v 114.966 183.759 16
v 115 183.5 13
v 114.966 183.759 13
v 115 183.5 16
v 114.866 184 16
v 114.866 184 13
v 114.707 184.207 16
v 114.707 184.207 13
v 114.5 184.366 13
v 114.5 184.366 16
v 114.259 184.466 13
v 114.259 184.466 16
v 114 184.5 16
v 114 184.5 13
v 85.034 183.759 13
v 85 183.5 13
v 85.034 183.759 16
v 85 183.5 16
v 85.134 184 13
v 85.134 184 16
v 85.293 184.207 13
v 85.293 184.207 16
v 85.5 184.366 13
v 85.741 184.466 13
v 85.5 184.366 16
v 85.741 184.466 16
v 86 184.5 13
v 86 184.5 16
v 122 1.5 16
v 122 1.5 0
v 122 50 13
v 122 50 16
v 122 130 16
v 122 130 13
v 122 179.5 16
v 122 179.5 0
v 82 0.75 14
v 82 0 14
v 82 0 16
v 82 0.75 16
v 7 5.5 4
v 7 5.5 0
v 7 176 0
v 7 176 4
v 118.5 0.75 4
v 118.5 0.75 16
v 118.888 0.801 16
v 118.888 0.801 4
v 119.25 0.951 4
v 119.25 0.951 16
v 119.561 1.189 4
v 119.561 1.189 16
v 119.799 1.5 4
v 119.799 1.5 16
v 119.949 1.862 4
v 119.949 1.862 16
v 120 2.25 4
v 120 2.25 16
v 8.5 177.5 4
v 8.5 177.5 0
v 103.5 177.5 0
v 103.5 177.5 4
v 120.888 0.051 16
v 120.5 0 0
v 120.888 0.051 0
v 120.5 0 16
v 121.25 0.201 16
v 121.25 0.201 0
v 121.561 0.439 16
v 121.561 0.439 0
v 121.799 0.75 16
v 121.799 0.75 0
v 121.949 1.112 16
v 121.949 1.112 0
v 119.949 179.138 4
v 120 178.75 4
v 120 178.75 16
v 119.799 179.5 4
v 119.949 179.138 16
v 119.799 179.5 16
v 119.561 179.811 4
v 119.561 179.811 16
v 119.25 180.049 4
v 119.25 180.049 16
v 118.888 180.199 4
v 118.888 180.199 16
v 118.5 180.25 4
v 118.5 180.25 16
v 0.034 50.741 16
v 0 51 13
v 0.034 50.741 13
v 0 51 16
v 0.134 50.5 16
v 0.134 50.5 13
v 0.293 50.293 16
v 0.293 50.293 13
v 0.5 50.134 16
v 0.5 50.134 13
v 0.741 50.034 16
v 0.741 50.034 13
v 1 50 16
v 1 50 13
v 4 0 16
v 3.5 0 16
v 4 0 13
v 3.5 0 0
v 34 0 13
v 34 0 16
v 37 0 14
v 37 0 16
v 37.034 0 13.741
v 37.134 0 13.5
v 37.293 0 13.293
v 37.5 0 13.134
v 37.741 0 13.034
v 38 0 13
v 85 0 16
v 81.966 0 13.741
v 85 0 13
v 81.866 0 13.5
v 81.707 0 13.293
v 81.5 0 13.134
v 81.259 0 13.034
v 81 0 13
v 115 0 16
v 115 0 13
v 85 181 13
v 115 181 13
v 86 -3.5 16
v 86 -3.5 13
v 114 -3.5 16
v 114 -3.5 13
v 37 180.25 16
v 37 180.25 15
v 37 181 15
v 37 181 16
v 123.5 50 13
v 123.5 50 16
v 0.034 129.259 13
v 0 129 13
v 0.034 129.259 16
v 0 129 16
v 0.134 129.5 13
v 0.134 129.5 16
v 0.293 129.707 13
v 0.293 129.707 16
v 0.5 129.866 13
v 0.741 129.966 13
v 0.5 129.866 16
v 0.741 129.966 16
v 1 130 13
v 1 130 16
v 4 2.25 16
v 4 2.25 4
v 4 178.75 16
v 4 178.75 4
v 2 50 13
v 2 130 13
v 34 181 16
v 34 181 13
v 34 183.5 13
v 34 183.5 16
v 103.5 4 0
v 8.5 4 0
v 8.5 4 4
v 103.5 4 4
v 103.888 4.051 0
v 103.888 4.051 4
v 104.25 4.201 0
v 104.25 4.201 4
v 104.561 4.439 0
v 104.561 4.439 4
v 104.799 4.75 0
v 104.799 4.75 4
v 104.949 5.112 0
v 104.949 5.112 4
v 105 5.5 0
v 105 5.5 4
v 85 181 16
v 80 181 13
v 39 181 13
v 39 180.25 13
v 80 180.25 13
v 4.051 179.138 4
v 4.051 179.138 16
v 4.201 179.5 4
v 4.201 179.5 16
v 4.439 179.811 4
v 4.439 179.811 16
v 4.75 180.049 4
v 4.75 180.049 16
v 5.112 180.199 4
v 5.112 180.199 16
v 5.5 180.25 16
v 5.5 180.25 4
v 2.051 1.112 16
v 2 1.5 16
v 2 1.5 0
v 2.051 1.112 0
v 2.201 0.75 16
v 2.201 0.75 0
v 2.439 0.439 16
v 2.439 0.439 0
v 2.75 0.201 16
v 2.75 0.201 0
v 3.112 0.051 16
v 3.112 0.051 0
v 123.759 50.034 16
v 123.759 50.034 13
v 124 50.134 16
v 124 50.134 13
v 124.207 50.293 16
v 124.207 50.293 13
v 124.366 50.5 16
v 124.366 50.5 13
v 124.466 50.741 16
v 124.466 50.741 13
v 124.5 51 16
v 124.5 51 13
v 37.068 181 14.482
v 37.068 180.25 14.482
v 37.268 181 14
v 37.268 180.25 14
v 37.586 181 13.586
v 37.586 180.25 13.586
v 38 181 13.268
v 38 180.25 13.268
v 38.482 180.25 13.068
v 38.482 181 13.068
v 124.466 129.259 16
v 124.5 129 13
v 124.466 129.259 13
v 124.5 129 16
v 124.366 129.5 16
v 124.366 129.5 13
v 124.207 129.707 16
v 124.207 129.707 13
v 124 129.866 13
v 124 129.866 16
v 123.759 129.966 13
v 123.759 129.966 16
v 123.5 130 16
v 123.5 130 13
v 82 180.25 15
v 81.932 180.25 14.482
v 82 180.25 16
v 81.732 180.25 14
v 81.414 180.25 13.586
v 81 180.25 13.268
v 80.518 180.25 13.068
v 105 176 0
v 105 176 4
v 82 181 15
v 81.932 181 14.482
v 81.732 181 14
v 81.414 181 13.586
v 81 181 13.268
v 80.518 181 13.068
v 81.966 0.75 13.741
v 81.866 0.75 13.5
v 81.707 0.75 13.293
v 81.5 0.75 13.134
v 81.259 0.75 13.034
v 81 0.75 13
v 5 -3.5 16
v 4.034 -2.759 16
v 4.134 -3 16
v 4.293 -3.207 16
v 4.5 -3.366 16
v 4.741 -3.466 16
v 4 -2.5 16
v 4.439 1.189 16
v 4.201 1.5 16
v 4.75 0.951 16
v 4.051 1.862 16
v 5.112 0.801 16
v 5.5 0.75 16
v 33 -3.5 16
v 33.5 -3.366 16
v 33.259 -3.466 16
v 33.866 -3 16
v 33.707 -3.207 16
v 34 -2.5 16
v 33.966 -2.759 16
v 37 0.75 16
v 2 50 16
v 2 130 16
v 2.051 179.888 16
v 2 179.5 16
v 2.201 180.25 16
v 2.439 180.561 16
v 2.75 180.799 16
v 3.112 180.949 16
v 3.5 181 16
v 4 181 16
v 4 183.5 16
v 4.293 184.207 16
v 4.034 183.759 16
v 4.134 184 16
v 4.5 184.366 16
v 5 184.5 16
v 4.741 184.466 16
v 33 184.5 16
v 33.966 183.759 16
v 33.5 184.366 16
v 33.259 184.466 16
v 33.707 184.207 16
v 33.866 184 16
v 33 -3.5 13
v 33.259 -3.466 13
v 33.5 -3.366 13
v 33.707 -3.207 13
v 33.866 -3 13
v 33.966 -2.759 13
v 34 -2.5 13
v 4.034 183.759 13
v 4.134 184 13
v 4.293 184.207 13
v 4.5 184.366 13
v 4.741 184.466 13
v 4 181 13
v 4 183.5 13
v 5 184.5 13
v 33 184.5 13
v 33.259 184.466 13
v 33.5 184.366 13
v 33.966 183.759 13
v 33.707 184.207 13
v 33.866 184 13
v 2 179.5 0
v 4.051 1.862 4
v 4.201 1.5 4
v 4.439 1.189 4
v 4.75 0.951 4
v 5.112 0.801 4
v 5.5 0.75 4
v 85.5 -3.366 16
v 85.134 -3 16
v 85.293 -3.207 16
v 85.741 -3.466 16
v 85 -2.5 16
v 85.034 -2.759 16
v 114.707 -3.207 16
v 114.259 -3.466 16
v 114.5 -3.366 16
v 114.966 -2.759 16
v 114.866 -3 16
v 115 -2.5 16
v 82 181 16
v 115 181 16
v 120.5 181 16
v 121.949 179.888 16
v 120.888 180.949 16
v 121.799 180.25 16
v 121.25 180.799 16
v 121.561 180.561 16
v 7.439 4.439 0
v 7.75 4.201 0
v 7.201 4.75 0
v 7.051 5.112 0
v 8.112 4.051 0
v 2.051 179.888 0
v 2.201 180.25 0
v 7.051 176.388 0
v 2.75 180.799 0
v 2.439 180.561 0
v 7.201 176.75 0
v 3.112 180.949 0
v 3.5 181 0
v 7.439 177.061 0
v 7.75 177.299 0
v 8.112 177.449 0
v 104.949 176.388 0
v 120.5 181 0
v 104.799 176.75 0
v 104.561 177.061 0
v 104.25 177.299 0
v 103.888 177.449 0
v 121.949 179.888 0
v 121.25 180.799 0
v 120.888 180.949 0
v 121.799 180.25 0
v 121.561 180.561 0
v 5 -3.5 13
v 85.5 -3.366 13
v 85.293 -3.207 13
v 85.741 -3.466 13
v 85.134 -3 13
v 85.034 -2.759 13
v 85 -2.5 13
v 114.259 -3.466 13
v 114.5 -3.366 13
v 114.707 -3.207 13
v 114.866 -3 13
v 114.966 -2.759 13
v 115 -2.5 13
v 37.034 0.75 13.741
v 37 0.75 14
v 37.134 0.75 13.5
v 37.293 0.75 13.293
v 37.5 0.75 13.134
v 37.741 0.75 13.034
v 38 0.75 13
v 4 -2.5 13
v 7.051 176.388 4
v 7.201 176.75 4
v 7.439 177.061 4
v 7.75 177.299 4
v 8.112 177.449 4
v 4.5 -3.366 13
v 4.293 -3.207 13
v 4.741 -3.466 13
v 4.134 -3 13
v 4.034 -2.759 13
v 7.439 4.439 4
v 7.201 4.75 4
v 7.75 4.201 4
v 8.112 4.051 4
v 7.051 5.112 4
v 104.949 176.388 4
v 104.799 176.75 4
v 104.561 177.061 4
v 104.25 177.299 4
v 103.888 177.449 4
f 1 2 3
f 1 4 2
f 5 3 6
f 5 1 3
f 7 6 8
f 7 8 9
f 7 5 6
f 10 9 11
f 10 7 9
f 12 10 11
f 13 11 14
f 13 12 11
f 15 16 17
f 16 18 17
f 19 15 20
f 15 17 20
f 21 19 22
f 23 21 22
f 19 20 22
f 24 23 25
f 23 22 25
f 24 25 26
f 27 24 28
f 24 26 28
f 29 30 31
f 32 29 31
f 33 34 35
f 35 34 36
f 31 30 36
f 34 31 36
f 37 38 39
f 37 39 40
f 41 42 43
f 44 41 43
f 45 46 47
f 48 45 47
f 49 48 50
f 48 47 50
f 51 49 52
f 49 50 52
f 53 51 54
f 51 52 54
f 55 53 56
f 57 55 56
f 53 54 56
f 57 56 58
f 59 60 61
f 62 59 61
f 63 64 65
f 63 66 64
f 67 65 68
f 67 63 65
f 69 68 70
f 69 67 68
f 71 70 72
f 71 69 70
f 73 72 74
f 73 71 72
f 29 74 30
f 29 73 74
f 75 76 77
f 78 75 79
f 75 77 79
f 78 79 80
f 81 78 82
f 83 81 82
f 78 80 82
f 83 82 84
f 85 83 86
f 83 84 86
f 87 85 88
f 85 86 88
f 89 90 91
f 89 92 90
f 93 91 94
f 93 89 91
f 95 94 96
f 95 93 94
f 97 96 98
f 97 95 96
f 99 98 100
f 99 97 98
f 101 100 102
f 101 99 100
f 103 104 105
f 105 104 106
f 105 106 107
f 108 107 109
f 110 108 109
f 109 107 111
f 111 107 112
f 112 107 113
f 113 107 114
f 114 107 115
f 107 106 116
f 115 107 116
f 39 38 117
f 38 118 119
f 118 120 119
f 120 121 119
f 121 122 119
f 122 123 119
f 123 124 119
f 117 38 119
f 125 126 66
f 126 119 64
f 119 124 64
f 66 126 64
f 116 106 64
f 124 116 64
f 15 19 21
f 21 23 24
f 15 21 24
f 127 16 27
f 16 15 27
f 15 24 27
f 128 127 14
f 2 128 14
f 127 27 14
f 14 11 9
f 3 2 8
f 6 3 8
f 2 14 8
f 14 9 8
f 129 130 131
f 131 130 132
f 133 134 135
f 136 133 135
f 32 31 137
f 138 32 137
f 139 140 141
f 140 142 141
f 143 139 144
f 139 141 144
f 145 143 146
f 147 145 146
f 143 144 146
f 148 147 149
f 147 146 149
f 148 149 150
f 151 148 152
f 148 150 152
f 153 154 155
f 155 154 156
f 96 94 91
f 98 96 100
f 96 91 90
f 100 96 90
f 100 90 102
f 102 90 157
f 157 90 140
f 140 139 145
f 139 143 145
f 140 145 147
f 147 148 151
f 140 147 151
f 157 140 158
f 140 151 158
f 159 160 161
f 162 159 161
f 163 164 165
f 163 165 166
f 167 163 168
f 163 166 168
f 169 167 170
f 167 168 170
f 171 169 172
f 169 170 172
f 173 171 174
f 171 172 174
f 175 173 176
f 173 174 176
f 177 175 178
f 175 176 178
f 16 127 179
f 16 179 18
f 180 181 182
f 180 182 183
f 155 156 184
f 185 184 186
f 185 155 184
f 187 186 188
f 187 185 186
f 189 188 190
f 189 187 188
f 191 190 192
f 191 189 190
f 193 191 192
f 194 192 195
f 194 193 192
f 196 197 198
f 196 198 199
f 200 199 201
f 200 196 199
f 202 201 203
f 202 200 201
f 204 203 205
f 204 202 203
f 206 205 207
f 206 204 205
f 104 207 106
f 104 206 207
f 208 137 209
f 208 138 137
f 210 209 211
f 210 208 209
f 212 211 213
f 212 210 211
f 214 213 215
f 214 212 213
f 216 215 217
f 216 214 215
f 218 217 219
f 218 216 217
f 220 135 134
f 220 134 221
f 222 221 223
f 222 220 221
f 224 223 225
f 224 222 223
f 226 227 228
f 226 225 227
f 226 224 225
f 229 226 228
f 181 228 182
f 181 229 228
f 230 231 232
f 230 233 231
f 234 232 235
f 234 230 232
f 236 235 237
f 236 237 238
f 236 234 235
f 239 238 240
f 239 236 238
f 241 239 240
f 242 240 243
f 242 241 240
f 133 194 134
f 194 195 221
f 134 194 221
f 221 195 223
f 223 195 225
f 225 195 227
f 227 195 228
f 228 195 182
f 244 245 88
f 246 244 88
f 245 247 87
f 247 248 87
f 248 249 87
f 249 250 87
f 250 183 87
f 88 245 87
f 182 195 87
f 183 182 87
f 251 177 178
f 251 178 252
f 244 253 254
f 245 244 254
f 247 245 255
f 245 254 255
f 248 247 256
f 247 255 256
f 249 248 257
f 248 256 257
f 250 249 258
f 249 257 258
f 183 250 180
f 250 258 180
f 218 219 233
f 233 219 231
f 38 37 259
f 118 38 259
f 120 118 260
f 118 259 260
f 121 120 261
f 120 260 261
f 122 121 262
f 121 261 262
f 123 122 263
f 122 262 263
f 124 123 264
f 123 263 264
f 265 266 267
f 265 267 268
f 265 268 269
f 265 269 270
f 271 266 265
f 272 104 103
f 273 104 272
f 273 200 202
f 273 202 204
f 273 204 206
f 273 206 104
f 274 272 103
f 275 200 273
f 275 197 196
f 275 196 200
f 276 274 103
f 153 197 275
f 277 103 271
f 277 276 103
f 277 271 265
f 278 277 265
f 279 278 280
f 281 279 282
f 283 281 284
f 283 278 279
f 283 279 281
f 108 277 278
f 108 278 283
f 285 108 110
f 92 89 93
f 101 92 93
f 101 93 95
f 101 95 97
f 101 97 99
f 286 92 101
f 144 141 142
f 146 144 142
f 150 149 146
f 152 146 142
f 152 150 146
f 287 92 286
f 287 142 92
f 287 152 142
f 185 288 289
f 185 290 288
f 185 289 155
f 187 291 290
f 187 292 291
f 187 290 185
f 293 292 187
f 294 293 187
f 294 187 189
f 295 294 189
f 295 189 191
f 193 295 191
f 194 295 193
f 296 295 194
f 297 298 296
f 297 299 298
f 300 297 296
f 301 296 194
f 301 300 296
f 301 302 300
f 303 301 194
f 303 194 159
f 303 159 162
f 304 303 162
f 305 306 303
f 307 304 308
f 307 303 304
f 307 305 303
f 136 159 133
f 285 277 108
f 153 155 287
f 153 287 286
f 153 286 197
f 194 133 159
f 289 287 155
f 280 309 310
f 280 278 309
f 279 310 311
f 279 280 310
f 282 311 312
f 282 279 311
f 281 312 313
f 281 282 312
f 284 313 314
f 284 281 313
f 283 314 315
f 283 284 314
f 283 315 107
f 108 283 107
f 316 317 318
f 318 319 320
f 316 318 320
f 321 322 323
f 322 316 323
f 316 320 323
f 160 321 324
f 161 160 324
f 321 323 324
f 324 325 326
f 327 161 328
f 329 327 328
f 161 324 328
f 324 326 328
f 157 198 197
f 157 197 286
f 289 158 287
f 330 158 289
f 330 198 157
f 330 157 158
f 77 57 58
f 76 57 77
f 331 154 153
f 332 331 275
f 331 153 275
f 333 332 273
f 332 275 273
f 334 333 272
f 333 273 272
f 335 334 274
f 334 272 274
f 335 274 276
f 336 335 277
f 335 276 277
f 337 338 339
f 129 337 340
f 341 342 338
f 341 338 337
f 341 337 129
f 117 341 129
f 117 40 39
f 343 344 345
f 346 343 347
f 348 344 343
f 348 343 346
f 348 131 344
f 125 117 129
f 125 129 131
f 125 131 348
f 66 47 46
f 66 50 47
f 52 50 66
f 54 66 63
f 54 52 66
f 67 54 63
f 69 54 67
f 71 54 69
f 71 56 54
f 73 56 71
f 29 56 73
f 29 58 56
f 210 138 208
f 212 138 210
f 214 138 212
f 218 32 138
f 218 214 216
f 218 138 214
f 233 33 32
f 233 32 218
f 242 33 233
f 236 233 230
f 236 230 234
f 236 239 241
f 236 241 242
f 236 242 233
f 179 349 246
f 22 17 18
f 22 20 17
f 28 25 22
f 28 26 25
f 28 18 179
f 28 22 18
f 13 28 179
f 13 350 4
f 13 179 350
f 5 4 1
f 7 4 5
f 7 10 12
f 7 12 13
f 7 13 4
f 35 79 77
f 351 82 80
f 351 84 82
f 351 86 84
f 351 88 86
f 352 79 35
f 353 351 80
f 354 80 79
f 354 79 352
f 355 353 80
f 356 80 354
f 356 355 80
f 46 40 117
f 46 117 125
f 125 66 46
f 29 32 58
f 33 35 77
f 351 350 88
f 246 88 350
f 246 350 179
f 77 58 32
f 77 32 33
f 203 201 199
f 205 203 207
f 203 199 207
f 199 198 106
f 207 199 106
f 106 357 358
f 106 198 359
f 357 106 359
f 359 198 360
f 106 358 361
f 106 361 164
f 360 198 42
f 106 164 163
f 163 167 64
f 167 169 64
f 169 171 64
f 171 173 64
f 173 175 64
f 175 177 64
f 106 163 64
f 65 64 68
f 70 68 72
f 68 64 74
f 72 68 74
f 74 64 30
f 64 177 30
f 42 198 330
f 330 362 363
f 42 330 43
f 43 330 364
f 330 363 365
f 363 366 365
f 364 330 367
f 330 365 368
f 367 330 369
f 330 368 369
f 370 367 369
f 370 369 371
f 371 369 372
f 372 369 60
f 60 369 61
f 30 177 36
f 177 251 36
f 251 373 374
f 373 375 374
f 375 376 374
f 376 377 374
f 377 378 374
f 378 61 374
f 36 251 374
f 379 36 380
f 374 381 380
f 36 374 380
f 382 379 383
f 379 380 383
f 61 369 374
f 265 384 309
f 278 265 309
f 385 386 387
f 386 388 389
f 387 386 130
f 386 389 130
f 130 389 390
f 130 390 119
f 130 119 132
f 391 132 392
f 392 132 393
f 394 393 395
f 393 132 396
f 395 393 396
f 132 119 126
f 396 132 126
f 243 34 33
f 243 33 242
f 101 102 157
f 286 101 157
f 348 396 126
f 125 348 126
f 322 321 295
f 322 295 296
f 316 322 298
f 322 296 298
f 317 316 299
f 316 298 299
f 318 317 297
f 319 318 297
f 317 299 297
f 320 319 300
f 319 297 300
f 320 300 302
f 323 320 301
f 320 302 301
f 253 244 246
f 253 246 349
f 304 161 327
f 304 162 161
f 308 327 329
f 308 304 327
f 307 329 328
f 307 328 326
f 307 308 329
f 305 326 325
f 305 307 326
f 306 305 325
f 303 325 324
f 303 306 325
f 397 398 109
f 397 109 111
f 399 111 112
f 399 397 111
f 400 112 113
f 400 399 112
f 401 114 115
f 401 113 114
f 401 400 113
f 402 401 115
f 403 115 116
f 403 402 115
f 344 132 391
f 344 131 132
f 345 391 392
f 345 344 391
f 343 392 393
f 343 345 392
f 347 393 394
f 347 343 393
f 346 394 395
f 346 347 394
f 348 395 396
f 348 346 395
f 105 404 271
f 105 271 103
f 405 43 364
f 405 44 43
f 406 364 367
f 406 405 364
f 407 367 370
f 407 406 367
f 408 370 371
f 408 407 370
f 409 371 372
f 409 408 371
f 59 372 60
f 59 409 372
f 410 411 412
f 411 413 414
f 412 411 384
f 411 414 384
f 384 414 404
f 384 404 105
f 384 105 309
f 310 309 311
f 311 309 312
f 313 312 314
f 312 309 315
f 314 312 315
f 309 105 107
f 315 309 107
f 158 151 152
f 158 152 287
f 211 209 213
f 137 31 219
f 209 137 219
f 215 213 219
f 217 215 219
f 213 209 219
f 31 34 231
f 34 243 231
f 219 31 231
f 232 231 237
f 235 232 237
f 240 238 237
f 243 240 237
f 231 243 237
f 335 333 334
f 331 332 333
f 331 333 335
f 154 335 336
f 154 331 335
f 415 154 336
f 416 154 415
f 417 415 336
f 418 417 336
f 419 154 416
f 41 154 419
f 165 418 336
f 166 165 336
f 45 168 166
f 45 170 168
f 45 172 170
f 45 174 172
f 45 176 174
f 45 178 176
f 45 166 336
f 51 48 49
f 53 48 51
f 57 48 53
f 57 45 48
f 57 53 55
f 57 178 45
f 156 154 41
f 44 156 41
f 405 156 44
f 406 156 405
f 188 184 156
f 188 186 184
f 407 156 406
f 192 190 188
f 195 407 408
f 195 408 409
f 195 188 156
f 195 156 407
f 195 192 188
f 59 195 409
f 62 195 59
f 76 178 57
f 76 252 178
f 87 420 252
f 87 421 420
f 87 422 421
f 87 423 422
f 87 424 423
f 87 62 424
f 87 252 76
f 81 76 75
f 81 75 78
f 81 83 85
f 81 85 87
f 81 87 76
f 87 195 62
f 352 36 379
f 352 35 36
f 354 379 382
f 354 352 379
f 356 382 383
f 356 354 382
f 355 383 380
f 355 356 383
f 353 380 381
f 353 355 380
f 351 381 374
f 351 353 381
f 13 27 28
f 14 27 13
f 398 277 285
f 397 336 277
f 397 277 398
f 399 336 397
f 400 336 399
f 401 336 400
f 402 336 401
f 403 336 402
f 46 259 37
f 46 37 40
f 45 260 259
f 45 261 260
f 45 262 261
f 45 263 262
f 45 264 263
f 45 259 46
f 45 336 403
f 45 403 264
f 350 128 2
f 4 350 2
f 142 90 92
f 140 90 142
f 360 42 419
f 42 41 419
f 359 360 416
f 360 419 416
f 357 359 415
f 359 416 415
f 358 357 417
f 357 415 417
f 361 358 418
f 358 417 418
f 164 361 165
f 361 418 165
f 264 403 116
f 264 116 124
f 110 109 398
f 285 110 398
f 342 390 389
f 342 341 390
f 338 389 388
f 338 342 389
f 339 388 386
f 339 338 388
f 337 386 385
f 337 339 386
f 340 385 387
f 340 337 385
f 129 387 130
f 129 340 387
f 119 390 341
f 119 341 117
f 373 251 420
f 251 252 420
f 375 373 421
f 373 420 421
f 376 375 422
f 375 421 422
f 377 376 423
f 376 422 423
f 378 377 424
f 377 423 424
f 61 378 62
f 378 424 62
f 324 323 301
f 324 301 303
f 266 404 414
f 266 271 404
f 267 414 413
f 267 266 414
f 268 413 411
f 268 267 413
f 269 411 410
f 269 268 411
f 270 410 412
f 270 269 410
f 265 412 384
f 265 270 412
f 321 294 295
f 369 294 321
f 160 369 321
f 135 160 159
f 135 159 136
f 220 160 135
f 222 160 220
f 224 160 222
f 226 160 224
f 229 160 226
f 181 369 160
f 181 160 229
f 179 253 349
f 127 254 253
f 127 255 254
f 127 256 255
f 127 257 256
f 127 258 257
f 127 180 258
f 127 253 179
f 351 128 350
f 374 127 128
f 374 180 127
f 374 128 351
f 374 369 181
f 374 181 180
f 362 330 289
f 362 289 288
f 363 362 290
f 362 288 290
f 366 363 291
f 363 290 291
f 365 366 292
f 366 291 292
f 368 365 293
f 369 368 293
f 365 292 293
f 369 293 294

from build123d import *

# Parameters (mm, degrees)
BOX011_W      = 4
BOX011_H      = 80
BOX011_DEPTH  = 3
FILLET006_R   = 1
BOX010_W      = 30
BOX010_H      = 4
BOX010_DEPTH  = 3
FILLET007_R   = 1
BOX009_W      = 30
BOX009_H      = 4
BOX009_DEPTH  = 3
FILLET008_R   = 1
BOX008_W      = 30
BOX008_H      = 4
BOX008_DEPTH  = 3
FILLET009_R   = 1
BOX013_W      = 4
BOX013_H      = 80
BOX013_DEPTH  = 3
FILLET010_R   = 1
BOX012_W      = 30
BOX012_H      = 4
BOX012_DEPTH  = 3
FILLET005_R   = 1
BOX006_W      = 45
BOX006_H      = 10
BOX006_DEPTH  = 10
BOX007_W      = 45
BOX007_H      = 10
BOX007_DEPTH  = 10
FILLET004_1_R = 2
FILLET004_2_R = 1
BOX003_W      = 116
BOX003_H      = 179.5
BOX003_DEPTH  = 20
FILLET002_R   = 1.5
BOX002_W      = 120
BOX002_H      = 181
BOX002_DEPTH  = 12
FILLET003_R   = 1.5
BOX001_W      = 98
BOX001_H      = 173.5
BOX001_DEPTH  = 4
FILLET_R      = 1.5
BOX_W         = 120
BOX_H         = 181
BOX_DEPTH     = 4
FILLET001_R   = 1.5


with BuildPart() as fillet006:
    # Box011 → Box011 (new body)
    with BuildSketch(Plane(origin=(0, 50, 5), x_dir=(1, 0, 0), z_dir=(0, 0, 1))):
        with Locations((2, 40)):
            Rectangle(BOX011_W, BOX011_H)
    extrude(amount=BOX011_DEPTH)

    # Fillet006
    fillet006_edges = [fillet006.edges().sort_by_distance(p)[0] for p in [
        (0, 50, 6.5),
        (0, 130, 6.5),
    ]]
    fillet(fillet006_edges, radius=FILLET006_R)


with BuildPart() as fillet007:
    # Box010 → Box010 (new body)
    with BuildSketch(Plane(origin=(85, -3.5, 5), x_dir=(1, 0, 0), z_dir=(0, 0, 1))):
        with Locations((15, 2)):
            Rectangle(BOX010_W, BOX010_H)
    extrude(amount=BOX010_DEPTH)

    # Fillet007
    fillet007_edges = [fillet007.edges().sort_by_distance(p)[0] for p in [
        (85, -3.5, 6.5),
        (115, -3.5, 6.5),
    ]]
    fillet(fillet007_edges, radius=FILLET007_R)


with BuildPart() as fillet008:
    # Box009 → Box009 (new body)
    with BuildSketch(Plane(origin=(4, 180.5, 5), x_dir=(1, 0, 0), z_dir=(0, 0, 1))):
        with Locations((15, 2)):
            Rectangle(BOX009_W, BOX009_H)
    extrude(amount=BOX009_DEPTH)

    # Fillet008
    fillet008_edges = [fillet008.edges().sort_by_distance(p)[0] for p in [
        (4, 184.5, 6.5),
        (34, 184.5, 6.5),
    ]]
    fillet(fillet008_edges, radius=FILLET008_R)


with BuildPart() as fillet009:
    # Box008 → Box008 (new body)
    with BuildSketch(Plane(origin=(85, 180.5, 5), x_dir=(1, 0, 0), z_dir=(0, 0, 1))):
        with Locations((15, 2)):
            Rectangle(BOX008_W, BOX008_H)
    extrude(amount=BOX008_DEPTH)

    # Fillet009
    fillet009_edges = [fillet009.edges().sort_by_distance(p)[0] for p in [
        (85, 184.5, 6.5),
        (115, 184.5, 6.5),
    ]]
    fillet(fillet009_edges, radius=FILLET009_R)


with BuildPart() as fillet010:
    # Box013 → Box013 (new body)
    with BuildSketch(Plane(origin=(120.5, 50, 5), x_dir=(1, 0, 0), z_dir=(0, 0, 1))):
        with Locations((2, 40)):
            Rectangle(BOX013_W, BOX013_H)
    extrude(amount=BOX013_DEPTH)

    # Fillet010
    fillet010_edges = [fillet010.edges().sort_by_distance(p)[0] for p in [
        (124.5, 50, 6.5),
        (124.5, 130, 6.5),
    ]]
    fillet(fillet010_edges, radius=FILLET010_R)


with BuildPart() as fusion002:
    # Box012 → Box012 (new body)
    with BuildSketch(Plane(origin=(4, -3.5, 5), x_dir=(1, 0, 0), z_dir=(0, 0, 1))):
        with Locations((15, 2)):
            Rectangle(BOX012_W, BOX012_H)
    extrude(amount=BOX012_DEPTH)

    # Fillet005
    fillet005_edges = [fusion002.edges().sort_by_distance(p)[0] for p in [
        (4, -3.5, 6.5),
        (34, -3.5, 6.5),
    ]]
    fillet(fillet005_edges, radius=FILLET005_R)

    # Fusion002: union Fillet006, Fillet007, Fillet008, Fillet009, Fillet010
    add(fillet006.part)
    add(fillet007.part)
    add(fillet008.part)
    add(fillet009.part)
    add(fillet010.part)


with BuildPart() as fusion002_1:
    # Fusion002 placement: moved
    add(fusion002.part.moved(Location((0, 0, 8))))


with BuildPart() as cube006:
    # Box006 → Box006 (new body)
    with BuildSketch(Plane(origin=(15, -5, 0), x_dir=(1, 0, 0), z_dir=(0, 0, 1))):
        with Locations((22.5, 5)):
            Rectangle(BOX006_W, BOX006_H)
    extrude(amount=BOX006_DEPTH)


with BuildPart() as fillet004:
    # Box007 → Box007 (new body)
    with BuildSketch(Plane(origin=(15, 175, 0), x_dir=(1, 0, 0), z_dir=(0, 0, 1))):
        with Locations((22.5, 5)):
            Rectangle(BOX007_W, BOX007_H)
    extrude(amount=BOX007_DEPTH)

    # Fusion: union Cube006
    add(cube006.part)


with BuildPart() as fillet004_1:
    # Fusion placement: moved
    add(fillet004.part.moved(Location((22, 0, 13))))

    # Fillet004 1
    fillet004_1_edges = [fillet004_1.edges().sort_by_distance(p)[0] for p in [
        (37, 180, 13),
        (82, 180, 13),
    ]]
    fillet(fillet004_1_edges, radius=FILLET004_1_R)

    # Fillet004 2
    fillet004_2_edges = [fillet004_1.edges().sort_by_distance(p)[0] for p in [
        (37, 0, 13),
        (82, 0, 13),
    ]]
    fillet(fillet004_2_edges, radius=FILLET004_2_R)


with BuildPart() as fillet002:
    # Box003 → Box003 (new body)
    with BuildSketch(Plane(origin=(4, 0.75, 4), x_dir=(1, 0, 0), z_dir=(0, 0, 1))):
        with Locations((58, 89.75)):
            Rectangle(BOX003_W, BOX003_H)
    extrude(amount=BOX003_DEPTH)

    # Fillet002
    fillet002_edges = [fillet002.edges().sort_by_distance(p)[0] for p in [
        (4, 0.75, 14),
        (4, 180.25, 14),
        (120, 0.75, 14),
        (120, 180.25, 14),
    ]]
    fillet(fillet002_edges, radius=FILLET002_R)


with BuildPart() as cut002:
    # Box002 → Box002 (new body)
    with BuildSketch(Plane(origin=(2, 0, 4), x_dir=(1, 0, 0), z_dir=(0, 0, 1))):
        with Locations((60, 90.5)):
            Rectangle(BOX002_W, BOX002_H)
    extrude(amount=BOX002_DEPTH)

    # Fillet003
    fillet003_edges = [cut002.edges().sort_by_distance(p)[0] for p in [
        (2, 0, 10),
        (2, 181, 10),
        (122, 0, 10),
        (122, 181, 10),
    ]]
    fillet(fillet003_edges, radius=FILLET003_R)

    # Cut001: cut Fillet002
    add(fillet002.part, mode=Mode.SUBTRACT)

    # Cut002: cut Fillet004
    add(fillet004_1.part, mode=Mode.SUBTRACT)


with BuildPart() as fillet_body:
    # Box001 → Box001 (new body)
    with BuildSketch(Plane(origin=(7, 4, 0), x_dir=(1, 0, 0), z_dir=(0, 0, 1))):
        with Locations((49, 86.75)):
            Rectangle(BOX001_W, BOX001_H)
    extrude(amount=BOX001_DEPTH)

    # Fillet
    fillet_edges = [fillet_body.edges().sort_by_distance(p)[0] for p in [
        (7, 4, 2),
        (7, 177.5, 2),
        (105, 4, 2),
        (105, 177.5, 2),
    ]]
    fillet(fillet_edges, radius=FILLET_R)


with BuildPart() as fusion003:
    # Box → Box (new body)
    with BuildSketch(Plane(origin=(2, 0, 0), x_dir=(1, 0, 0), z_dir=(0, 0, 1))):
        with Locations((60, 90.5)):
            Rectangle(BOX_W, BOX_H)
    extrude(amount=BOX_DEPTH)

    # Fillet001
    fillet001_edges = [fusion003.edges().sort_by_distance(p)[0] for p in [
        (2, 0, 2),
        (2, 181, 2),
        (122, 0, 2),
        (122, 181, 2),
    ]]
    fillet(fillet001_edges, radius=FILLET001_R)

    # Cut: cut Fillet body
    add(fillet_body.part, mode=Mode.SUBTRACT)

    # Fusion001: union Cut002
    add(cut002.part)

    # Fusion003: union Fusion002
    add(fusion002_1.part)


solid = fusion003.part
